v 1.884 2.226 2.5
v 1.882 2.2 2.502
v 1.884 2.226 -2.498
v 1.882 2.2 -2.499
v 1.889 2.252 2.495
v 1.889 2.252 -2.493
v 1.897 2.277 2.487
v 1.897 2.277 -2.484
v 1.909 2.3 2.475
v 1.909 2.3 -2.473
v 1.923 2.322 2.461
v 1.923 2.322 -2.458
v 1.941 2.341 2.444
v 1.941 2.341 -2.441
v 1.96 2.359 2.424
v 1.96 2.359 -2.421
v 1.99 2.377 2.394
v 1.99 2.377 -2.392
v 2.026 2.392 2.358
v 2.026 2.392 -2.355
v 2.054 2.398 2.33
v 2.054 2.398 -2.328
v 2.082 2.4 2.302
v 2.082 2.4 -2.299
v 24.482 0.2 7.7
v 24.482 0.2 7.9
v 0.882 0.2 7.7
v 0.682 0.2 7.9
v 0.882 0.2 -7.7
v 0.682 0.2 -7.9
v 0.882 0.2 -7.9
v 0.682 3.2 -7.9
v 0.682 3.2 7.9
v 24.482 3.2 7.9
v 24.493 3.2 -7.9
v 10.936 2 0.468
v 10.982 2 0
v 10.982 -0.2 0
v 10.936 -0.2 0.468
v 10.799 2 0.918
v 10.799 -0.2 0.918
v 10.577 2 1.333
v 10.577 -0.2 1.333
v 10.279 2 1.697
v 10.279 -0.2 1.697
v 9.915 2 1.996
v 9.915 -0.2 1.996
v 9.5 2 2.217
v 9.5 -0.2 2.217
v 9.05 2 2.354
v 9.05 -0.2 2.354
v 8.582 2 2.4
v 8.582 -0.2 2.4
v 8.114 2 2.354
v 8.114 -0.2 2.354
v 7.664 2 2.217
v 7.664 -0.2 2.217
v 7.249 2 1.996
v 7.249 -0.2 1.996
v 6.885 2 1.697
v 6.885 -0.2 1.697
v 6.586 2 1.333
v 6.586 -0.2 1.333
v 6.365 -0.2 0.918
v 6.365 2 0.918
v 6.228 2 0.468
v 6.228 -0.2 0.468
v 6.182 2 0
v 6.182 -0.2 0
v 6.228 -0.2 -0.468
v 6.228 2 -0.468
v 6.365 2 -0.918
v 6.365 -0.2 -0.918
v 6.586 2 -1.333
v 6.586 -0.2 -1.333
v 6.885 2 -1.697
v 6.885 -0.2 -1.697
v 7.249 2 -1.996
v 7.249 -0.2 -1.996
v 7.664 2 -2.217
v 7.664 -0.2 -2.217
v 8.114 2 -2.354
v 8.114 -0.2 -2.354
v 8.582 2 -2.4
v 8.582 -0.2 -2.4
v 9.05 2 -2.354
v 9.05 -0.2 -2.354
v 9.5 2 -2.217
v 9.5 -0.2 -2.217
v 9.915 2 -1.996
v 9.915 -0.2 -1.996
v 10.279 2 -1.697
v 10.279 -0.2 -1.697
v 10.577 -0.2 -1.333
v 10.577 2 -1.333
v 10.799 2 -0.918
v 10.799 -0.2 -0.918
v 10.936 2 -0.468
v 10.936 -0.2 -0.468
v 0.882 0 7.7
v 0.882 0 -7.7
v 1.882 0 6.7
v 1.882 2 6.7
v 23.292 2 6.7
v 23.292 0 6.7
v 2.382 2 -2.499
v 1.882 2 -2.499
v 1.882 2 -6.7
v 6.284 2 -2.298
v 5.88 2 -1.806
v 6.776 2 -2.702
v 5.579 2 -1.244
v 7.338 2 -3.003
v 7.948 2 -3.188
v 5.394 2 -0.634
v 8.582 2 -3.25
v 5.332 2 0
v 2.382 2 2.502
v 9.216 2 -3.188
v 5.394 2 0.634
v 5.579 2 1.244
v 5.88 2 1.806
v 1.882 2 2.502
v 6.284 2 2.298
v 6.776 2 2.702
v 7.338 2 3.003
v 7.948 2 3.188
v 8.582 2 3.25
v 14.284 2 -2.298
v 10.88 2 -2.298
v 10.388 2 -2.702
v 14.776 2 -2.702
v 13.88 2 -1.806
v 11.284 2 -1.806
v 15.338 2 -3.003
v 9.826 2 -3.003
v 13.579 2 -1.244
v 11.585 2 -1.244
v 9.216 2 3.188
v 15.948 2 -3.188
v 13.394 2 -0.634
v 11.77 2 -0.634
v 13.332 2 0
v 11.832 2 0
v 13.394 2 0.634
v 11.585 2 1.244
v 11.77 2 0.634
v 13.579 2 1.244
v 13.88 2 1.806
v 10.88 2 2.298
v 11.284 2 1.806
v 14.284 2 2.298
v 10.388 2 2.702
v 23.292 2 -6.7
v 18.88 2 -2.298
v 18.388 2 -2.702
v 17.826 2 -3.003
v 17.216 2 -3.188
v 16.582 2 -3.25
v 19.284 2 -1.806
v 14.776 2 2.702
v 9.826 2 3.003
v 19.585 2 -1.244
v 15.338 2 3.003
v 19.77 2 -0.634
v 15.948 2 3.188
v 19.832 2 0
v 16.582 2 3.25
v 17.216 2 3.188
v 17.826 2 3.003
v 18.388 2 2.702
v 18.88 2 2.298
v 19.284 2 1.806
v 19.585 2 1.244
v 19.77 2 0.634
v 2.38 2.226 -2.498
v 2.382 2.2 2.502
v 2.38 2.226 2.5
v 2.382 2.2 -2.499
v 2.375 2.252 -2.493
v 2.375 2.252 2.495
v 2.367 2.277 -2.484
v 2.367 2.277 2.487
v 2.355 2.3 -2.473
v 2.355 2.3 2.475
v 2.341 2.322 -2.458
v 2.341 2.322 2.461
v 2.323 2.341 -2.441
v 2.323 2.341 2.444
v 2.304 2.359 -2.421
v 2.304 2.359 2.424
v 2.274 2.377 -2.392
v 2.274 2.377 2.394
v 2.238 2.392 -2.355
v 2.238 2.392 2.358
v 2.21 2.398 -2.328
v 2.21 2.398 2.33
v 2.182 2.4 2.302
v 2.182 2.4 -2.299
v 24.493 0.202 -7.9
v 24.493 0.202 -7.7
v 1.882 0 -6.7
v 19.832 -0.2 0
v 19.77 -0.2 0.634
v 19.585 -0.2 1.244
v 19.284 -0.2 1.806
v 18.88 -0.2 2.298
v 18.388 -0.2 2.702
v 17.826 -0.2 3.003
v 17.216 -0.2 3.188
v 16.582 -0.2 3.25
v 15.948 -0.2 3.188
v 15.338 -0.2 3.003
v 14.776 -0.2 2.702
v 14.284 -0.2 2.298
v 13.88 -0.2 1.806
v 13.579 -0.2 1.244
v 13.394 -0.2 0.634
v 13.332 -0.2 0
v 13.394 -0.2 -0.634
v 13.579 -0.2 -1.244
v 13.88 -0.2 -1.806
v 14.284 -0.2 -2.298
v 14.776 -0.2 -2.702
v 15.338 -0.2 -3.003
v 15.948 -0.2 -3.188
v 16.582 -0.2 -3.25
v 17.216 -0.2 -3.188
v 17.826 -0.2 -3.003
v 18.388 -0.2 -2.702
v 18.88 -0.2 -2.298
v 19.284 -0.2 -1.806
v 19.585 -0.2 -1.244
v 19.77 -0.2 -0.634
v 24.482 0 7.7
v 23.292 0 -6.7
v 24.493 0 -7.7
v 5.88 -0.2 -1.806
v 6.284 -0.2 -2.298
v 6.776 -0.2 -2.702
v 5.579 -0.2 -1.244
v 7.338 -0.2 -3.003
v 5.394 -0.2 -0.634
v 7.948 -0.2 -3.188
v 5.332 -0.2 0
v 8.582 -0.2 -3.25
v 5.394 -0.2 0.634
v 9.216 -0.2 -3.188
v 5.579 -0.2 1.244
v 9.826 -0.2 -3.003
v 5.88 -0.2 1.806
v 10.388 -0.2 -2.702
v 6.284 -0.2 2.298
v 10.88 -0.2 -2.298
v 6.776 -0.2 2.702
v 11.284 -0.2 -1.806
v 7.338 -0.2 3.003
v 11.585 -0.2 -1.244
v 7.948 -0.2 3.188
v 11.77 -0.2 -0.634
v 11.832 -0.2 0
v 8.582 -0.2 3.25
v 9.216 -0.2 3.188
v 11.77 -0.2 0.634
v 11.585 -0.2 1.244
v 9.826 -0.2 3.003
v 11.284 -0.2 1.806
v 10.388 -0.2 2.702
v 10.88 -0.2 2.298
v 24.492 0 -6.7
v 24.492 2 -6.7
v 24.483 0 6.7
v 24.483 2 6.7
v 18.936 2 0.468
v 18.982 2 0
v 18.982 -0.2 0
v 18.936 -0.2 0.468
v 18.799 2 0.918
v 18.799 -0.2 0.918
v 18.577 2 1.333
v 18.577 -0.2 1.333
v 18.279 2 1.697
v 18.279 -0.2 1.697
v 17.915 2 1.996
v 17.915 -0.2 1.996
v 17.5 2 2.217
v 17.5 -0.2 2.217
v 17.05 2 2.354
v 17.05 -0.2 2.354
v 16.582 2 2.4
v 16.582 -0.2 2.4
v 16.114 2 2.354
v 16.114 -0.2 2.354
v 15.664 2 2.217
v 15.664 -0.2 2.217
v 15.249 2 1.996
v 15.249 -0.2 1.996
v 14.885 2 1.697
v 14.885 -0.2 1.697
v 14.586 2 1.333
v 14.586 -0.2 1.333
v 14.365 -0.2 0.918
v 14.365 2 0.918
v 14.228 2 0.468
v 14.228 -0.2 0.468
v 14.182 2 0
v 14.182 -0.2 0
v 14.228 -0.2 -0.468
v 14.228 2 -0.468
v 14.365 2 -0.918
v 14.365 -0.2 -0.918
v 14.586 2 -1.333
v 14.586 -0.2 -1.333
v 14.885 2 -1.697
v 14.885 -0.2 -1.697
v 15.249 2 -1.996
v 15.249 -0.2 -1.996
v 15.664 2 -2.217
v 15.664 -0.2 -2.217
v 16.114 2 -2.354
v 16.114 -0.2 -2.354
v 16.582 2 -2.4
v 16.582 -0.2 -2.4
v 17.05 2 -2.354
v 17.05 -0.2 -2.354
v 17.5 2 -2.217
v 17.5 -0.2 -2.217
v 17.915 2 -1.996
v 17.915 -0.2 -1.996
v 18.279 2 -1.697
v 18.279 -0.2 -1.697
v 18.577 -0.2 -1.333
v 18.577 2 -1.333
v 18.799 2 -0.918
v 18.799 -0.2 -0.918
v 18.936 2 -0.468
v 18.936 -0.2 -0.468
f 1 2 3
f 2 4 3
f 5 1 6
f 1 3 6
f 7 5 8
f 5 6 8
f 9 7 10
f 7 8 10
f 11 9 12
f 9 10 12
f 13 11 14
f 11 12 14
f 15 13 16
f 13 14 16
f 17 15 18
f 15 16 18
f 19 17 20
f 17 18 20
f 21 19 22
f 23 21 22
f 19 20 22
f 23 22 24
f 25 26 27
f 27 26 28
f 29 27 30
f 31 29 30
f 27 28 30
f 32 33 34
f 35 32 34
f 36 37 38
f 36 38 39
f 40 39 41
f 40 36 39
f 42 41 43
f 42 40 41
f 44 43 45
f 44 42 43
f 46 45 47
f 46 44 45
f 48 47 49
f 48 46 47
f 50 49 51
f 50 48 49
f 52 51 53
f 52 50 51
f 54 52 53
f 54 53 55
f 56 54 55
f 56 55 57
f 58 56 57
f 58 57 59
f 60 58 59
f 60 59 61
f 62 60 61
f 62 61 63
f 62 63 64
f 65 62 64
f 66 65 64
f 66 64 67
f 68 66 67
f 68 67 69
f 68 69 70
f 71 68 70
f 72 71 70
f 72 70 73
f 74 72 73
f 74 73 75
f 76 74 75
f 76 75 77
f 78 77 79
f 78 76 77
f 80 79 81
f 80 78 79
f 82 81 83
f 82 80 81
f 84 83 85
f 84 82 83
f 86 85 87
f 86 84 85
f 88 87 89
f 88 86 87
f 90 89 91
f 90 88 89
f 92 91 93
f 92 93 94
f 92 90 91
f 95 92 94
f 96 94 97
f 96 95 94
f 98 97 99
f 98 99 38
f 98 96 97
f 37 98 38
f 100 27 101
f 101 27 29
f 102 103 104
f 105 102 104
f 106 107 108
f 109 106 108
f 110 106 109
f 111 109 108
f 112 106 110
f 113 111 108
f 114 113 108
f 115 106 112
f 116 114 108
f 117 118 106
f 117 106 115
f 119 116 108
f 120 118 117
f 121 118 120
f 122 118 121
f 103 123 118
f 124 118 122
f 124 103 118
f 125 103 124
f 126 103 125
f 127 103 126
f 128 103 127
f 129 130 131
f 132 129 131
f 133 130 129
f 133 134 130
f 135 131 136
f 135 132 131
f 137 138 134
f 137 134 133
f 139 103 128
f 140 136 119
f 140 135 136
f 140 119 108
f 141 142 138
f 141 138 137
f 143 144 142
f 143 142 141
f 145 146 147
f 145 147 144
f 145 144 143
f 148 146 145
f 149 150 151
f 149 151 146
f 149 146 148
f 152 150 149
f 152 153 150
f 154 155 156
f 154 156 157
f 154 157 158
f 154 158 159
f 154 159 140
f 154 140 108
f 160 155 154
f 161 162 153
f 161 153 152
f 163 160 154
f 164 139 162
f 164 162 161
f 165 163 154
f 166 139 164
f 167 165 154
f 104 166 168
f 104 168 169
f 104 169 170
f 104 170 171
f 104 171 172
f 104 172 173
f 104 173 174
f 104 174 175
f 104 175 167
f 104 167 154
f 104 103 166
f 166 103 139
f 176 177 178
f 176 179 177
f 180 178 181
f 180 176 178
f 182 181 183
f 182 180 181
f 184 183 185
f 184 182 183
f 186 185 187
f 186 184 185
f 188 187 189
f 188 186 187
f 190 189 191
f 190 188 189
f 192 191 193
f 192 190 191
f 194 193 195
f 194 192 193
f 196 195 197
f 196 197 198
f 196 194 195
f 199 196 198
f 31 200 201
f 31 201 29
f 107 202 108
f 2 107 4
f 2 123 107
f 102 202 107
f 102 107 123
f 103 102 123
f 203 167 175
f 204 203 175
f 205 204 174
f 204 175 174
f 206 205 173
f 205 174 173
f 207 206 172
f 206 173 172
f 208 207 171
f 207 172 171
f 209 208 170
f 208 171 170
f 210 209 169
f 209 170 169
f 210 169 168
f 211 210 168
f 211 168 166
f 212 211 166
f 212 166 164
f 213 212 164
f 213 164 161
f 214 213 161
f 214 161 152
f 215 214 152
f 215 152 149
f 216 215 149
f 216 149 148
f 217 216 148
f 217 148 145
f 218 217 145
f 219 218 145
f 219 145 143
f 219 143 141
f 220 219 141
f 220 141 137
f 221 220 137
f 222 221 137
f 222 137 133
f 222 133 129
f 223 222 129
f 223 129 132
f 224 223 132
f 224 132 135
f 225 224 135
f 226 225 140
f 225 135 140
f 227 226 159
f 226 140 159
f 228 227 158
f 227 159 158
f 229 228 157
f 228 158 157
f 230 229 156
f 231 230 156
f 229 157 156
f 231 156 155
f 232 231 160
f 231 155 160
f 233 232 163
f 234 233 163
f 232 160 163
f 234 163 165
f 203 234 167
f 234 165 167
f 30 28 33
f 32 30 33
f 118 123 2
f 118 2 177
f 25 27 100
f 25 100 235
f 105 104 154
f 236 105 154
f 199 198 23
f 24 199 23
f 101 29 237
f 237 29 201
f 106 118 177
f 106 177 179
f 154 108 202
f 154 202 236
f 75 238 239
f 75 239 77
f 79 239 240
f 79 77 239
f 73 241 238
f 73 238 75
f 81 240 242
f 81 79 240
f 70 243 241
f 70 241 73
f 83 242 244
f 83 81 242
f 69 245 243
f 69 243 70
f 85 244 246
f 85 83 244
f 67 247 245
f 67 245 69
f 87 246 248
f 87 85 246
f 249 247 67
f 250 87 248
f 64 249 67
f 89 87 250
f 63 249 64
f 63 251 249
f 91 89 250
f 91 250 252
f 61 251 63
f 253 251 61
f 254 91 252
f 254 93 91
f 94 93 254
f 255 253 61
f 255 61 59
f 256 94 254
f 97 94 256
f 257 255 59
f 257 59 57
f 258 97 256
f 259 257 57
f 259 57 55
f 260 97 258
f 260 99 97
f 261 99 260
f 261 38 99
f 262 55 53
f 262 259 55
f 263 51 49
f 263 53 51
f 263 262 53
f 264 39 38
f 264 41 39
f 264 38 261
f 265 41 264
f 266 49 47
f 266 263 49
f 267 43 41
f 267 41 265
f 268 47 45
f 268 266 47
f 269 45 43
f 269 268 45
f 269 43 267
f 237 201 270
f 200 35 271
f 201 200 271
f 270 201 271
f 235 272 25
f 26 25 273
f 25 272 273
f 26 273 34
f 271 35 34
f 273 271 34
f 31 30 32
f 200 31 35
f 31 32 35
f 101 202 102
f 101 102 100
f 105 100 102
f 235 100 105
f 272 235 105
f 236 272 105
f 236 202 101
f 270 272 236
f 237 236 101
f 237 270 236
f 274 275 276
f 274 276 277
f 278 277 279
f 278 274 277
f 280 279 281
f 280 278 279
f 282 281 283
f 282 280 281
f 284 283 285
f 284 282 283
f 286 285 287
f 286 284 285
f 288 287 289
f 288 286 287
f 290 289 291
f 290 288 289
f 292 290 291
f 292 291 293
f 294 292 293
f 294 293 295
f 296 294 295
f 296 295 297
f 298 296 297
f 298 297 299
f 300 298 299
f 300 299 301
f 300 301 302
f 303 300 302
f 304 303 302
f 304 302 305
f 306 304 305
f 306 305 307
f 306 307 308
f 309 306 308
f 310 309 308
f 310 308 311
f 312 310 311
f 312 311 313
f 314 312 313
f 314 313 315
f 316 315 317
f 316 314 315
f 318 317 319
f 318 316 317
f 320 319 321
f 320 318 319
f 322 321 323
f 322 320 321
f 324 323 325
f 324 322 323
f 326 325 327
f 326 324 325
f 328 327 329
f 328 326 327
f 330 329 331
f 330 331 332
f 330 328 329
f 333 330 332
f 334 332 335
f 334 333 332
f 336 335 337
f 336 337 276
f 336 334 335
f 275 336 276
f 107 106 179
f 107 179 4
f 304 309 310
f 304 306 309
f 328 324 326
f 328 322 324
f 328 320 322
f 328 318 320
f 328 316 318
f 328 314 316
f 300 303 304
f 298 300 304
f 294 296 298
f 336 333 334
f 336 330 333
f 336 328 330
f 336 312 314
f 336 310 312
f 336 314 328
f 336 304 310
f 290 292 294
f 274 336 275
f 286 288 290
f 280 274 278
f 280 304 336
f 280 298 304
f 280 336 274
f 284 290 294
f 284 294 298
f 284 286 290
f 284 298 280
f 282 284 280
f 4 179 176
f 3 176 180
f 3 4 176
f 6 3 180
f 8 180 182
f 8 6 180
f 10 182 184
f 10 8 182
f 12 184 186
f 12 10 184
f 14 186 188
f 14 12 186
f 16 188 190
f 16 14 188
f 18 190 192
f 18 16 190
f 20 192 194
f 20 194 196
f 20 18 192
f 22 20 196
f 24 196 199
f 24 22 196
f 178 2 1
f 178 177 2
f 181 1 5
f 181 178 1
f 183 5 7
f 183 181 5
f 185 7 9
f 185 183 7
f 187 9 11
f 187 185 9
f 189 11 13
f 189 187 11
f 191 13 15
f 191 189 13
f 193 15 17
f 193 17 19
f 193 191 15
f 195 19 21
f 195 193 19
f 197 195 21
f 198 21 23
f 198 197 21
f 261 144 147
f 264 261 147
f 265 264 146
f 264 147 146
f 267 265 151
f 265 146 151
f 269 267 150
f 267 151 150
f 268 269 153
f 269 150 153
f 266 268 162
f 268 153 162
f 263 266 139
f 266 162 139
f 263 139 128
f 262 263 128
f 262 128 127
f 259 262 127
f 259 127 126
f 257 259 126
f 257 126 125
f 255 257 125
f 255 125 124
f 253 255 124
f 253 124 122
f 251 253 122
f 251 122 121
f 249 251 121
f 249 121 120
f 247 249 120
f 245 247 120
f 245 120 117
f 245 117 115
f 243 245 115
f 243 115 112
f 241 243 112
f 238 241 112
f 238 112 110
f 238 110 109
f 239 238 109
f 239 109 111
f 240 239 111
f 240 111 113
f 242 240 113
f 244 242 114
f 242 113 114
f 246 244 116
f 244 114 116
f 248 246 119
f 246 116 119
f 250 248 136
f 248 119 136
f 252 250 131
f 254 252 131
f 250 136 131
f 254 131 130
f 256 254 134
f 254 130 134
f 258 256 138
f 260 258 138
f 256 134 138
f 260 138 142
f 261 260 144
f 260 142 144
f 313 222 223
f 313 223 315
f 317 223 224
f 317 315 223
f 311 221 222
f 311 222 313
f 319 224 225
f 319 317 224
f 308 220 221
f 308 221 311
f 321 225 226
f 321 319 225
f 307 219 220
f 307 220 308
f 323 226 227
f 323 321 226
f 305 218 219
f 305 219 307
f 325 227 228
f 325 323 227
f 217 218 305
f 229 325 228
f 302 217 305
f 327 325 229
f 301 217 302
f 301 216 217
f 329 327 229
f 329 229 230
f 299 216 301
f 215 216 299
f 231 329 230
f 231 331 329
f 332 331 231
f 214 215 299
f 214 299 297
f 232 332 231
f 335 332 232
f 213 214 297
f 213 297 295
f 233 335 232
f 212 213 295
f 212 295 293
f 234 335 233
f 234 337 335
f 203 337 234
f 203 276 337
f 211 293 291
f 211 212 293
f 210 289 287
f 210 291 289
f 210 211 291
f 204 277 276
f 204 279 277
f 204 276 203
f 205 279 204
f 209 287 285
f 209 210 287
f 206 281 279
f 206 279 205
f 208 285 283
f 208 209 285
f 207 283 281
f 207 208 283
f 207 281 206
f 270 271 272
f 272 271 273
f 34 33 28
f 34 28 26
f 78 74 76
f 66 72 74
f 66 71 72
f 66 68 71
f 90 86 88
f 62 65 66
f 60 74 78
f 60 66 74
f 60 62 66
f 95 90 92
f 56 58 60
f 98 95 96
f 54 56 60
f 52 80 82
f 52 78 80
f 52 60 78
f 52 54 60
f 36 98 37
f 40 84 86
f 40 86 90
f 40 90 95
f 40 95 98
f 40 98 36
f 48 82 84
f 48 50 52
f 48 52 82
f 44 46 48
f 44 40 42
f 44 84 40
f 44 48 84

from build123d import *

# Parameters (mm, degrees)
MAINBASESKETCH_W              = 47.8
MAINBASESKETCH_H              = 3.2
MAINBASEEXTRUDE_DEPTH         = 7.9
MAINBASESHELL_T               = -1.2
UNDERSIDECIRCLEEXT_START      = -0.2
UNDERSIDECIRCLESKETCH_R       = 3.25
UNDERSIDECIRCLESKETCH_R_2     = 2.4
UNDERSIDECIRCLEEXT_DEPTH      = 2.4
UNDERSIDECIRCLEPATTERN_COUNT  = 2
UNDERSIDECIRCLEPATTERN_PITCH  = 8
EXTENDEDBASEEDGECUT_DEPTH     = 0.2
EXTENDEDBASEEDGECUT2_DEPTH    = 0.2
EXTENDEDBASEEDGECUT3_DEPTH    = 0.2
EXTENDEDBASEEDGESKETCH4_W     = 47.4
EXTENDEDBASEEDGESKETCH4_H     = 0.199766916
EXTENDEDBASEEDGECUT4_DEPTH    = 0.2
EXTENDEDNBASEUNDERNOTCH_DEPTH = 0.4
EXTENDEBASENOTCHFILLET_R      = 0.2
CUT_EXTRUDE61_DEPTH           = 50.22551315
CUT_EXTRUDE61_DEPTH_BACK      = 50.22551315


with BuildPart() as part:
    # MainBaseSketch → MainBaseExtrude (new, symmetric)
    with BuildSketch(Plane.XY):
        with Locations((24.581967213, 1.6)):
            Rectangle(MAINBASESKETCH_W, MAINBASESKETCH_H)
    extrude(amount=MAINBASEEXTRUDE_DEPTH, both=True)

    # MainBaseShell
    mainbaseshell_openings = [part.faces().sort_by_distance(p)[0] for p in [
        (24.581967213, 0, 0),
    ]]
    offset(amount=MAINBASESHELL_T, openings=mainbaseshell_openings, kind=Kind.INTERSECTION)

    # UnderSideCircleSketch → UnderSideCircleExt (add)
    with BuildSketch(Plane.XZ.offset(-2).offset(UNDERSIDECIRCLEEXT_START)):
        with Locations((8.581967213, 0)):
            Circle(UNDERSIDECIRCLESKETCH_R)
        with Locations((8.581967213, 0)):
            Circle(UNDERSIDECIRCLESKETCH_R_2, mode=Mode.SUBTRACT)
    undersidecircleext = extrude(amount=UNDERSIDECIRCLEEXT_DEPTH)

    # UnderSideCirclePattern: UnderSideCircleExt ×2
    with Locations(*[(i * UNDERSIDECIRCLEPATTERN_PITCH, 0, 0) for i in range(1, UNDERSIDECIRCLEPATTERN_COUNT)]):
        add(undersidecircleext)

    # ExtendedBaseEdgeSketch → ExtendedBaseEdgeCut (cut)
    with BuildSketch(Plane.ZY.offset(-0.681967213)):
        Polygon((-7.9, 0), (-7.9, 0.199766916), (-7.702184024, 0.199766916), (7.702184024, 0.199766916), (7.9, 0.199766916), (7.9, 0), (7.702184024, 0), (-7.702184024, 0), align=None)
    extrude(amount=-EXTENDEDBASEEDGECUT_DEPTH, mode=Mode.SUBTRACT)

    # ExtendedBaseEdgeSketch2 → ExtendedBaseEdgeCut2 (cut)
    with BuildSketch(Plane(origin=(0, 0, -7.9), x_dir=(-1, 0, 0), z_dir=(0, 0, -1))):
        Polygon((-48.481967213, 0), (-48.481967213, 0.203418418), (-0.881967213, 0.199766916), (-0.881967213, 0), align=None)
    extrude(amount=-EXTENDEDBASEEDGECUT2_DEPTH, mode=Mode.SUBTRACT)

    # ExtendedBaseEdgeSketch3 → ExtendedBaseEdgeCut3 (cut)
    with BuildSketch(Plane(origin=(48.481967213, 0, 0), x_dir=(0, 0, -1), z_dir=(1, 0, 0))):
        Polygon((-7.9, 0), (-7.9, 0.199766916), (7.7, 0.203418418), (7.7, 0), align=None)
    extrude(amount=-EXTENDEDBASEEDGECUT3_DEPTH, mode=Mode.SUBTRACT)

    # ExtendedBaseEdgeSketch4 → ExtendedBaseEdgeCut4 (cut)
    with BuildSketch(Plane.XY.offset(7.9)):
        with Locations((24.581967213, 0.099883458)):
            Rectangle(EXTENDEDBASEEDGESKETCH4_W, EXTENDEDBASEEDGESKETCH4_H)
    extrude(amount=-EXTENDEDBASEEDGECUT4_DEPTH, mode=Mode.SUBTRACT)

    # ExtendedbaseUnderNotchSketch → ExtendednbaseUnderNotch (cut)
    with BuildSketch(Plane.XZ.offset(-2)):
        Polygon((1.881967213, 0), (1.881967213, 2.502100162), (2.381942481, 2.502100162), (2.381942481, -2.499482153), (1.881967213, -2.499482153), align=None)
    extrude(amount=-EXTENDEDNBASEUNDERNOTCH_DEPTH, mode=Mode.SUBTRACT)

    # ExtendebaseNotchFillet
    extendebasenotchfillet_edges = [part.edges().sort_by_distance(p)[0] for p in [
        (1.881967213, 2.4, 0.001309004),
        (2.131954847, 2.4, 2.502100162),
        (2.381942481, 2.4, 0.001309004),
        (2.131954847, 2.4, -2.499482153),
    ]]
    fillet(extendebasenotchfillet_edges, radius=EXTENDEBASENOTCHFILLET_R)

    # Sketch180 → Cut-Extrude61 (cut, two sides: drawn at the far end of the back side and taken through both)
    with BuildSketch(Plane(origin=(0, 0, 0), x_dir=(-1, 0, 0), z_dir=(0, -1, 0)).offset(-CUT_EXTRUDE61_DEPTH_BACK)):
        Polygon((-48.481967213, 7.9), (-24.493136363, 7.9), (-24.481967213, -7.9), (-48.481967213, -7.9), align=None)
    extrude(amount=CUT_EXTRUDE61_DEPTH + CUT_EXTRUDE61_DEPTH_BACK, mode=Mode.SUBTRACT)

    # Sweep30: sweep along a curve in space
    with BuildLine() as sweep30_path:
        Line((24.492288074, 0, -6.7), (24.492288074, 2, -6.7))
    # Sketch181 → Sweep30 (sweep)
    with BuildSketch(Plane(origin=(0, 0, 0), x_dir=(-1, 0, 0), z_dir=(0, -1, 0))):
        Polygon((-24.492288074, 6.7), (-23.292288074, 6.7), (-23.292288074, -6.7), (-24.482815503, -6.7), align=None)
    sweep(path=sweep30_path.line)


solid = part.part
